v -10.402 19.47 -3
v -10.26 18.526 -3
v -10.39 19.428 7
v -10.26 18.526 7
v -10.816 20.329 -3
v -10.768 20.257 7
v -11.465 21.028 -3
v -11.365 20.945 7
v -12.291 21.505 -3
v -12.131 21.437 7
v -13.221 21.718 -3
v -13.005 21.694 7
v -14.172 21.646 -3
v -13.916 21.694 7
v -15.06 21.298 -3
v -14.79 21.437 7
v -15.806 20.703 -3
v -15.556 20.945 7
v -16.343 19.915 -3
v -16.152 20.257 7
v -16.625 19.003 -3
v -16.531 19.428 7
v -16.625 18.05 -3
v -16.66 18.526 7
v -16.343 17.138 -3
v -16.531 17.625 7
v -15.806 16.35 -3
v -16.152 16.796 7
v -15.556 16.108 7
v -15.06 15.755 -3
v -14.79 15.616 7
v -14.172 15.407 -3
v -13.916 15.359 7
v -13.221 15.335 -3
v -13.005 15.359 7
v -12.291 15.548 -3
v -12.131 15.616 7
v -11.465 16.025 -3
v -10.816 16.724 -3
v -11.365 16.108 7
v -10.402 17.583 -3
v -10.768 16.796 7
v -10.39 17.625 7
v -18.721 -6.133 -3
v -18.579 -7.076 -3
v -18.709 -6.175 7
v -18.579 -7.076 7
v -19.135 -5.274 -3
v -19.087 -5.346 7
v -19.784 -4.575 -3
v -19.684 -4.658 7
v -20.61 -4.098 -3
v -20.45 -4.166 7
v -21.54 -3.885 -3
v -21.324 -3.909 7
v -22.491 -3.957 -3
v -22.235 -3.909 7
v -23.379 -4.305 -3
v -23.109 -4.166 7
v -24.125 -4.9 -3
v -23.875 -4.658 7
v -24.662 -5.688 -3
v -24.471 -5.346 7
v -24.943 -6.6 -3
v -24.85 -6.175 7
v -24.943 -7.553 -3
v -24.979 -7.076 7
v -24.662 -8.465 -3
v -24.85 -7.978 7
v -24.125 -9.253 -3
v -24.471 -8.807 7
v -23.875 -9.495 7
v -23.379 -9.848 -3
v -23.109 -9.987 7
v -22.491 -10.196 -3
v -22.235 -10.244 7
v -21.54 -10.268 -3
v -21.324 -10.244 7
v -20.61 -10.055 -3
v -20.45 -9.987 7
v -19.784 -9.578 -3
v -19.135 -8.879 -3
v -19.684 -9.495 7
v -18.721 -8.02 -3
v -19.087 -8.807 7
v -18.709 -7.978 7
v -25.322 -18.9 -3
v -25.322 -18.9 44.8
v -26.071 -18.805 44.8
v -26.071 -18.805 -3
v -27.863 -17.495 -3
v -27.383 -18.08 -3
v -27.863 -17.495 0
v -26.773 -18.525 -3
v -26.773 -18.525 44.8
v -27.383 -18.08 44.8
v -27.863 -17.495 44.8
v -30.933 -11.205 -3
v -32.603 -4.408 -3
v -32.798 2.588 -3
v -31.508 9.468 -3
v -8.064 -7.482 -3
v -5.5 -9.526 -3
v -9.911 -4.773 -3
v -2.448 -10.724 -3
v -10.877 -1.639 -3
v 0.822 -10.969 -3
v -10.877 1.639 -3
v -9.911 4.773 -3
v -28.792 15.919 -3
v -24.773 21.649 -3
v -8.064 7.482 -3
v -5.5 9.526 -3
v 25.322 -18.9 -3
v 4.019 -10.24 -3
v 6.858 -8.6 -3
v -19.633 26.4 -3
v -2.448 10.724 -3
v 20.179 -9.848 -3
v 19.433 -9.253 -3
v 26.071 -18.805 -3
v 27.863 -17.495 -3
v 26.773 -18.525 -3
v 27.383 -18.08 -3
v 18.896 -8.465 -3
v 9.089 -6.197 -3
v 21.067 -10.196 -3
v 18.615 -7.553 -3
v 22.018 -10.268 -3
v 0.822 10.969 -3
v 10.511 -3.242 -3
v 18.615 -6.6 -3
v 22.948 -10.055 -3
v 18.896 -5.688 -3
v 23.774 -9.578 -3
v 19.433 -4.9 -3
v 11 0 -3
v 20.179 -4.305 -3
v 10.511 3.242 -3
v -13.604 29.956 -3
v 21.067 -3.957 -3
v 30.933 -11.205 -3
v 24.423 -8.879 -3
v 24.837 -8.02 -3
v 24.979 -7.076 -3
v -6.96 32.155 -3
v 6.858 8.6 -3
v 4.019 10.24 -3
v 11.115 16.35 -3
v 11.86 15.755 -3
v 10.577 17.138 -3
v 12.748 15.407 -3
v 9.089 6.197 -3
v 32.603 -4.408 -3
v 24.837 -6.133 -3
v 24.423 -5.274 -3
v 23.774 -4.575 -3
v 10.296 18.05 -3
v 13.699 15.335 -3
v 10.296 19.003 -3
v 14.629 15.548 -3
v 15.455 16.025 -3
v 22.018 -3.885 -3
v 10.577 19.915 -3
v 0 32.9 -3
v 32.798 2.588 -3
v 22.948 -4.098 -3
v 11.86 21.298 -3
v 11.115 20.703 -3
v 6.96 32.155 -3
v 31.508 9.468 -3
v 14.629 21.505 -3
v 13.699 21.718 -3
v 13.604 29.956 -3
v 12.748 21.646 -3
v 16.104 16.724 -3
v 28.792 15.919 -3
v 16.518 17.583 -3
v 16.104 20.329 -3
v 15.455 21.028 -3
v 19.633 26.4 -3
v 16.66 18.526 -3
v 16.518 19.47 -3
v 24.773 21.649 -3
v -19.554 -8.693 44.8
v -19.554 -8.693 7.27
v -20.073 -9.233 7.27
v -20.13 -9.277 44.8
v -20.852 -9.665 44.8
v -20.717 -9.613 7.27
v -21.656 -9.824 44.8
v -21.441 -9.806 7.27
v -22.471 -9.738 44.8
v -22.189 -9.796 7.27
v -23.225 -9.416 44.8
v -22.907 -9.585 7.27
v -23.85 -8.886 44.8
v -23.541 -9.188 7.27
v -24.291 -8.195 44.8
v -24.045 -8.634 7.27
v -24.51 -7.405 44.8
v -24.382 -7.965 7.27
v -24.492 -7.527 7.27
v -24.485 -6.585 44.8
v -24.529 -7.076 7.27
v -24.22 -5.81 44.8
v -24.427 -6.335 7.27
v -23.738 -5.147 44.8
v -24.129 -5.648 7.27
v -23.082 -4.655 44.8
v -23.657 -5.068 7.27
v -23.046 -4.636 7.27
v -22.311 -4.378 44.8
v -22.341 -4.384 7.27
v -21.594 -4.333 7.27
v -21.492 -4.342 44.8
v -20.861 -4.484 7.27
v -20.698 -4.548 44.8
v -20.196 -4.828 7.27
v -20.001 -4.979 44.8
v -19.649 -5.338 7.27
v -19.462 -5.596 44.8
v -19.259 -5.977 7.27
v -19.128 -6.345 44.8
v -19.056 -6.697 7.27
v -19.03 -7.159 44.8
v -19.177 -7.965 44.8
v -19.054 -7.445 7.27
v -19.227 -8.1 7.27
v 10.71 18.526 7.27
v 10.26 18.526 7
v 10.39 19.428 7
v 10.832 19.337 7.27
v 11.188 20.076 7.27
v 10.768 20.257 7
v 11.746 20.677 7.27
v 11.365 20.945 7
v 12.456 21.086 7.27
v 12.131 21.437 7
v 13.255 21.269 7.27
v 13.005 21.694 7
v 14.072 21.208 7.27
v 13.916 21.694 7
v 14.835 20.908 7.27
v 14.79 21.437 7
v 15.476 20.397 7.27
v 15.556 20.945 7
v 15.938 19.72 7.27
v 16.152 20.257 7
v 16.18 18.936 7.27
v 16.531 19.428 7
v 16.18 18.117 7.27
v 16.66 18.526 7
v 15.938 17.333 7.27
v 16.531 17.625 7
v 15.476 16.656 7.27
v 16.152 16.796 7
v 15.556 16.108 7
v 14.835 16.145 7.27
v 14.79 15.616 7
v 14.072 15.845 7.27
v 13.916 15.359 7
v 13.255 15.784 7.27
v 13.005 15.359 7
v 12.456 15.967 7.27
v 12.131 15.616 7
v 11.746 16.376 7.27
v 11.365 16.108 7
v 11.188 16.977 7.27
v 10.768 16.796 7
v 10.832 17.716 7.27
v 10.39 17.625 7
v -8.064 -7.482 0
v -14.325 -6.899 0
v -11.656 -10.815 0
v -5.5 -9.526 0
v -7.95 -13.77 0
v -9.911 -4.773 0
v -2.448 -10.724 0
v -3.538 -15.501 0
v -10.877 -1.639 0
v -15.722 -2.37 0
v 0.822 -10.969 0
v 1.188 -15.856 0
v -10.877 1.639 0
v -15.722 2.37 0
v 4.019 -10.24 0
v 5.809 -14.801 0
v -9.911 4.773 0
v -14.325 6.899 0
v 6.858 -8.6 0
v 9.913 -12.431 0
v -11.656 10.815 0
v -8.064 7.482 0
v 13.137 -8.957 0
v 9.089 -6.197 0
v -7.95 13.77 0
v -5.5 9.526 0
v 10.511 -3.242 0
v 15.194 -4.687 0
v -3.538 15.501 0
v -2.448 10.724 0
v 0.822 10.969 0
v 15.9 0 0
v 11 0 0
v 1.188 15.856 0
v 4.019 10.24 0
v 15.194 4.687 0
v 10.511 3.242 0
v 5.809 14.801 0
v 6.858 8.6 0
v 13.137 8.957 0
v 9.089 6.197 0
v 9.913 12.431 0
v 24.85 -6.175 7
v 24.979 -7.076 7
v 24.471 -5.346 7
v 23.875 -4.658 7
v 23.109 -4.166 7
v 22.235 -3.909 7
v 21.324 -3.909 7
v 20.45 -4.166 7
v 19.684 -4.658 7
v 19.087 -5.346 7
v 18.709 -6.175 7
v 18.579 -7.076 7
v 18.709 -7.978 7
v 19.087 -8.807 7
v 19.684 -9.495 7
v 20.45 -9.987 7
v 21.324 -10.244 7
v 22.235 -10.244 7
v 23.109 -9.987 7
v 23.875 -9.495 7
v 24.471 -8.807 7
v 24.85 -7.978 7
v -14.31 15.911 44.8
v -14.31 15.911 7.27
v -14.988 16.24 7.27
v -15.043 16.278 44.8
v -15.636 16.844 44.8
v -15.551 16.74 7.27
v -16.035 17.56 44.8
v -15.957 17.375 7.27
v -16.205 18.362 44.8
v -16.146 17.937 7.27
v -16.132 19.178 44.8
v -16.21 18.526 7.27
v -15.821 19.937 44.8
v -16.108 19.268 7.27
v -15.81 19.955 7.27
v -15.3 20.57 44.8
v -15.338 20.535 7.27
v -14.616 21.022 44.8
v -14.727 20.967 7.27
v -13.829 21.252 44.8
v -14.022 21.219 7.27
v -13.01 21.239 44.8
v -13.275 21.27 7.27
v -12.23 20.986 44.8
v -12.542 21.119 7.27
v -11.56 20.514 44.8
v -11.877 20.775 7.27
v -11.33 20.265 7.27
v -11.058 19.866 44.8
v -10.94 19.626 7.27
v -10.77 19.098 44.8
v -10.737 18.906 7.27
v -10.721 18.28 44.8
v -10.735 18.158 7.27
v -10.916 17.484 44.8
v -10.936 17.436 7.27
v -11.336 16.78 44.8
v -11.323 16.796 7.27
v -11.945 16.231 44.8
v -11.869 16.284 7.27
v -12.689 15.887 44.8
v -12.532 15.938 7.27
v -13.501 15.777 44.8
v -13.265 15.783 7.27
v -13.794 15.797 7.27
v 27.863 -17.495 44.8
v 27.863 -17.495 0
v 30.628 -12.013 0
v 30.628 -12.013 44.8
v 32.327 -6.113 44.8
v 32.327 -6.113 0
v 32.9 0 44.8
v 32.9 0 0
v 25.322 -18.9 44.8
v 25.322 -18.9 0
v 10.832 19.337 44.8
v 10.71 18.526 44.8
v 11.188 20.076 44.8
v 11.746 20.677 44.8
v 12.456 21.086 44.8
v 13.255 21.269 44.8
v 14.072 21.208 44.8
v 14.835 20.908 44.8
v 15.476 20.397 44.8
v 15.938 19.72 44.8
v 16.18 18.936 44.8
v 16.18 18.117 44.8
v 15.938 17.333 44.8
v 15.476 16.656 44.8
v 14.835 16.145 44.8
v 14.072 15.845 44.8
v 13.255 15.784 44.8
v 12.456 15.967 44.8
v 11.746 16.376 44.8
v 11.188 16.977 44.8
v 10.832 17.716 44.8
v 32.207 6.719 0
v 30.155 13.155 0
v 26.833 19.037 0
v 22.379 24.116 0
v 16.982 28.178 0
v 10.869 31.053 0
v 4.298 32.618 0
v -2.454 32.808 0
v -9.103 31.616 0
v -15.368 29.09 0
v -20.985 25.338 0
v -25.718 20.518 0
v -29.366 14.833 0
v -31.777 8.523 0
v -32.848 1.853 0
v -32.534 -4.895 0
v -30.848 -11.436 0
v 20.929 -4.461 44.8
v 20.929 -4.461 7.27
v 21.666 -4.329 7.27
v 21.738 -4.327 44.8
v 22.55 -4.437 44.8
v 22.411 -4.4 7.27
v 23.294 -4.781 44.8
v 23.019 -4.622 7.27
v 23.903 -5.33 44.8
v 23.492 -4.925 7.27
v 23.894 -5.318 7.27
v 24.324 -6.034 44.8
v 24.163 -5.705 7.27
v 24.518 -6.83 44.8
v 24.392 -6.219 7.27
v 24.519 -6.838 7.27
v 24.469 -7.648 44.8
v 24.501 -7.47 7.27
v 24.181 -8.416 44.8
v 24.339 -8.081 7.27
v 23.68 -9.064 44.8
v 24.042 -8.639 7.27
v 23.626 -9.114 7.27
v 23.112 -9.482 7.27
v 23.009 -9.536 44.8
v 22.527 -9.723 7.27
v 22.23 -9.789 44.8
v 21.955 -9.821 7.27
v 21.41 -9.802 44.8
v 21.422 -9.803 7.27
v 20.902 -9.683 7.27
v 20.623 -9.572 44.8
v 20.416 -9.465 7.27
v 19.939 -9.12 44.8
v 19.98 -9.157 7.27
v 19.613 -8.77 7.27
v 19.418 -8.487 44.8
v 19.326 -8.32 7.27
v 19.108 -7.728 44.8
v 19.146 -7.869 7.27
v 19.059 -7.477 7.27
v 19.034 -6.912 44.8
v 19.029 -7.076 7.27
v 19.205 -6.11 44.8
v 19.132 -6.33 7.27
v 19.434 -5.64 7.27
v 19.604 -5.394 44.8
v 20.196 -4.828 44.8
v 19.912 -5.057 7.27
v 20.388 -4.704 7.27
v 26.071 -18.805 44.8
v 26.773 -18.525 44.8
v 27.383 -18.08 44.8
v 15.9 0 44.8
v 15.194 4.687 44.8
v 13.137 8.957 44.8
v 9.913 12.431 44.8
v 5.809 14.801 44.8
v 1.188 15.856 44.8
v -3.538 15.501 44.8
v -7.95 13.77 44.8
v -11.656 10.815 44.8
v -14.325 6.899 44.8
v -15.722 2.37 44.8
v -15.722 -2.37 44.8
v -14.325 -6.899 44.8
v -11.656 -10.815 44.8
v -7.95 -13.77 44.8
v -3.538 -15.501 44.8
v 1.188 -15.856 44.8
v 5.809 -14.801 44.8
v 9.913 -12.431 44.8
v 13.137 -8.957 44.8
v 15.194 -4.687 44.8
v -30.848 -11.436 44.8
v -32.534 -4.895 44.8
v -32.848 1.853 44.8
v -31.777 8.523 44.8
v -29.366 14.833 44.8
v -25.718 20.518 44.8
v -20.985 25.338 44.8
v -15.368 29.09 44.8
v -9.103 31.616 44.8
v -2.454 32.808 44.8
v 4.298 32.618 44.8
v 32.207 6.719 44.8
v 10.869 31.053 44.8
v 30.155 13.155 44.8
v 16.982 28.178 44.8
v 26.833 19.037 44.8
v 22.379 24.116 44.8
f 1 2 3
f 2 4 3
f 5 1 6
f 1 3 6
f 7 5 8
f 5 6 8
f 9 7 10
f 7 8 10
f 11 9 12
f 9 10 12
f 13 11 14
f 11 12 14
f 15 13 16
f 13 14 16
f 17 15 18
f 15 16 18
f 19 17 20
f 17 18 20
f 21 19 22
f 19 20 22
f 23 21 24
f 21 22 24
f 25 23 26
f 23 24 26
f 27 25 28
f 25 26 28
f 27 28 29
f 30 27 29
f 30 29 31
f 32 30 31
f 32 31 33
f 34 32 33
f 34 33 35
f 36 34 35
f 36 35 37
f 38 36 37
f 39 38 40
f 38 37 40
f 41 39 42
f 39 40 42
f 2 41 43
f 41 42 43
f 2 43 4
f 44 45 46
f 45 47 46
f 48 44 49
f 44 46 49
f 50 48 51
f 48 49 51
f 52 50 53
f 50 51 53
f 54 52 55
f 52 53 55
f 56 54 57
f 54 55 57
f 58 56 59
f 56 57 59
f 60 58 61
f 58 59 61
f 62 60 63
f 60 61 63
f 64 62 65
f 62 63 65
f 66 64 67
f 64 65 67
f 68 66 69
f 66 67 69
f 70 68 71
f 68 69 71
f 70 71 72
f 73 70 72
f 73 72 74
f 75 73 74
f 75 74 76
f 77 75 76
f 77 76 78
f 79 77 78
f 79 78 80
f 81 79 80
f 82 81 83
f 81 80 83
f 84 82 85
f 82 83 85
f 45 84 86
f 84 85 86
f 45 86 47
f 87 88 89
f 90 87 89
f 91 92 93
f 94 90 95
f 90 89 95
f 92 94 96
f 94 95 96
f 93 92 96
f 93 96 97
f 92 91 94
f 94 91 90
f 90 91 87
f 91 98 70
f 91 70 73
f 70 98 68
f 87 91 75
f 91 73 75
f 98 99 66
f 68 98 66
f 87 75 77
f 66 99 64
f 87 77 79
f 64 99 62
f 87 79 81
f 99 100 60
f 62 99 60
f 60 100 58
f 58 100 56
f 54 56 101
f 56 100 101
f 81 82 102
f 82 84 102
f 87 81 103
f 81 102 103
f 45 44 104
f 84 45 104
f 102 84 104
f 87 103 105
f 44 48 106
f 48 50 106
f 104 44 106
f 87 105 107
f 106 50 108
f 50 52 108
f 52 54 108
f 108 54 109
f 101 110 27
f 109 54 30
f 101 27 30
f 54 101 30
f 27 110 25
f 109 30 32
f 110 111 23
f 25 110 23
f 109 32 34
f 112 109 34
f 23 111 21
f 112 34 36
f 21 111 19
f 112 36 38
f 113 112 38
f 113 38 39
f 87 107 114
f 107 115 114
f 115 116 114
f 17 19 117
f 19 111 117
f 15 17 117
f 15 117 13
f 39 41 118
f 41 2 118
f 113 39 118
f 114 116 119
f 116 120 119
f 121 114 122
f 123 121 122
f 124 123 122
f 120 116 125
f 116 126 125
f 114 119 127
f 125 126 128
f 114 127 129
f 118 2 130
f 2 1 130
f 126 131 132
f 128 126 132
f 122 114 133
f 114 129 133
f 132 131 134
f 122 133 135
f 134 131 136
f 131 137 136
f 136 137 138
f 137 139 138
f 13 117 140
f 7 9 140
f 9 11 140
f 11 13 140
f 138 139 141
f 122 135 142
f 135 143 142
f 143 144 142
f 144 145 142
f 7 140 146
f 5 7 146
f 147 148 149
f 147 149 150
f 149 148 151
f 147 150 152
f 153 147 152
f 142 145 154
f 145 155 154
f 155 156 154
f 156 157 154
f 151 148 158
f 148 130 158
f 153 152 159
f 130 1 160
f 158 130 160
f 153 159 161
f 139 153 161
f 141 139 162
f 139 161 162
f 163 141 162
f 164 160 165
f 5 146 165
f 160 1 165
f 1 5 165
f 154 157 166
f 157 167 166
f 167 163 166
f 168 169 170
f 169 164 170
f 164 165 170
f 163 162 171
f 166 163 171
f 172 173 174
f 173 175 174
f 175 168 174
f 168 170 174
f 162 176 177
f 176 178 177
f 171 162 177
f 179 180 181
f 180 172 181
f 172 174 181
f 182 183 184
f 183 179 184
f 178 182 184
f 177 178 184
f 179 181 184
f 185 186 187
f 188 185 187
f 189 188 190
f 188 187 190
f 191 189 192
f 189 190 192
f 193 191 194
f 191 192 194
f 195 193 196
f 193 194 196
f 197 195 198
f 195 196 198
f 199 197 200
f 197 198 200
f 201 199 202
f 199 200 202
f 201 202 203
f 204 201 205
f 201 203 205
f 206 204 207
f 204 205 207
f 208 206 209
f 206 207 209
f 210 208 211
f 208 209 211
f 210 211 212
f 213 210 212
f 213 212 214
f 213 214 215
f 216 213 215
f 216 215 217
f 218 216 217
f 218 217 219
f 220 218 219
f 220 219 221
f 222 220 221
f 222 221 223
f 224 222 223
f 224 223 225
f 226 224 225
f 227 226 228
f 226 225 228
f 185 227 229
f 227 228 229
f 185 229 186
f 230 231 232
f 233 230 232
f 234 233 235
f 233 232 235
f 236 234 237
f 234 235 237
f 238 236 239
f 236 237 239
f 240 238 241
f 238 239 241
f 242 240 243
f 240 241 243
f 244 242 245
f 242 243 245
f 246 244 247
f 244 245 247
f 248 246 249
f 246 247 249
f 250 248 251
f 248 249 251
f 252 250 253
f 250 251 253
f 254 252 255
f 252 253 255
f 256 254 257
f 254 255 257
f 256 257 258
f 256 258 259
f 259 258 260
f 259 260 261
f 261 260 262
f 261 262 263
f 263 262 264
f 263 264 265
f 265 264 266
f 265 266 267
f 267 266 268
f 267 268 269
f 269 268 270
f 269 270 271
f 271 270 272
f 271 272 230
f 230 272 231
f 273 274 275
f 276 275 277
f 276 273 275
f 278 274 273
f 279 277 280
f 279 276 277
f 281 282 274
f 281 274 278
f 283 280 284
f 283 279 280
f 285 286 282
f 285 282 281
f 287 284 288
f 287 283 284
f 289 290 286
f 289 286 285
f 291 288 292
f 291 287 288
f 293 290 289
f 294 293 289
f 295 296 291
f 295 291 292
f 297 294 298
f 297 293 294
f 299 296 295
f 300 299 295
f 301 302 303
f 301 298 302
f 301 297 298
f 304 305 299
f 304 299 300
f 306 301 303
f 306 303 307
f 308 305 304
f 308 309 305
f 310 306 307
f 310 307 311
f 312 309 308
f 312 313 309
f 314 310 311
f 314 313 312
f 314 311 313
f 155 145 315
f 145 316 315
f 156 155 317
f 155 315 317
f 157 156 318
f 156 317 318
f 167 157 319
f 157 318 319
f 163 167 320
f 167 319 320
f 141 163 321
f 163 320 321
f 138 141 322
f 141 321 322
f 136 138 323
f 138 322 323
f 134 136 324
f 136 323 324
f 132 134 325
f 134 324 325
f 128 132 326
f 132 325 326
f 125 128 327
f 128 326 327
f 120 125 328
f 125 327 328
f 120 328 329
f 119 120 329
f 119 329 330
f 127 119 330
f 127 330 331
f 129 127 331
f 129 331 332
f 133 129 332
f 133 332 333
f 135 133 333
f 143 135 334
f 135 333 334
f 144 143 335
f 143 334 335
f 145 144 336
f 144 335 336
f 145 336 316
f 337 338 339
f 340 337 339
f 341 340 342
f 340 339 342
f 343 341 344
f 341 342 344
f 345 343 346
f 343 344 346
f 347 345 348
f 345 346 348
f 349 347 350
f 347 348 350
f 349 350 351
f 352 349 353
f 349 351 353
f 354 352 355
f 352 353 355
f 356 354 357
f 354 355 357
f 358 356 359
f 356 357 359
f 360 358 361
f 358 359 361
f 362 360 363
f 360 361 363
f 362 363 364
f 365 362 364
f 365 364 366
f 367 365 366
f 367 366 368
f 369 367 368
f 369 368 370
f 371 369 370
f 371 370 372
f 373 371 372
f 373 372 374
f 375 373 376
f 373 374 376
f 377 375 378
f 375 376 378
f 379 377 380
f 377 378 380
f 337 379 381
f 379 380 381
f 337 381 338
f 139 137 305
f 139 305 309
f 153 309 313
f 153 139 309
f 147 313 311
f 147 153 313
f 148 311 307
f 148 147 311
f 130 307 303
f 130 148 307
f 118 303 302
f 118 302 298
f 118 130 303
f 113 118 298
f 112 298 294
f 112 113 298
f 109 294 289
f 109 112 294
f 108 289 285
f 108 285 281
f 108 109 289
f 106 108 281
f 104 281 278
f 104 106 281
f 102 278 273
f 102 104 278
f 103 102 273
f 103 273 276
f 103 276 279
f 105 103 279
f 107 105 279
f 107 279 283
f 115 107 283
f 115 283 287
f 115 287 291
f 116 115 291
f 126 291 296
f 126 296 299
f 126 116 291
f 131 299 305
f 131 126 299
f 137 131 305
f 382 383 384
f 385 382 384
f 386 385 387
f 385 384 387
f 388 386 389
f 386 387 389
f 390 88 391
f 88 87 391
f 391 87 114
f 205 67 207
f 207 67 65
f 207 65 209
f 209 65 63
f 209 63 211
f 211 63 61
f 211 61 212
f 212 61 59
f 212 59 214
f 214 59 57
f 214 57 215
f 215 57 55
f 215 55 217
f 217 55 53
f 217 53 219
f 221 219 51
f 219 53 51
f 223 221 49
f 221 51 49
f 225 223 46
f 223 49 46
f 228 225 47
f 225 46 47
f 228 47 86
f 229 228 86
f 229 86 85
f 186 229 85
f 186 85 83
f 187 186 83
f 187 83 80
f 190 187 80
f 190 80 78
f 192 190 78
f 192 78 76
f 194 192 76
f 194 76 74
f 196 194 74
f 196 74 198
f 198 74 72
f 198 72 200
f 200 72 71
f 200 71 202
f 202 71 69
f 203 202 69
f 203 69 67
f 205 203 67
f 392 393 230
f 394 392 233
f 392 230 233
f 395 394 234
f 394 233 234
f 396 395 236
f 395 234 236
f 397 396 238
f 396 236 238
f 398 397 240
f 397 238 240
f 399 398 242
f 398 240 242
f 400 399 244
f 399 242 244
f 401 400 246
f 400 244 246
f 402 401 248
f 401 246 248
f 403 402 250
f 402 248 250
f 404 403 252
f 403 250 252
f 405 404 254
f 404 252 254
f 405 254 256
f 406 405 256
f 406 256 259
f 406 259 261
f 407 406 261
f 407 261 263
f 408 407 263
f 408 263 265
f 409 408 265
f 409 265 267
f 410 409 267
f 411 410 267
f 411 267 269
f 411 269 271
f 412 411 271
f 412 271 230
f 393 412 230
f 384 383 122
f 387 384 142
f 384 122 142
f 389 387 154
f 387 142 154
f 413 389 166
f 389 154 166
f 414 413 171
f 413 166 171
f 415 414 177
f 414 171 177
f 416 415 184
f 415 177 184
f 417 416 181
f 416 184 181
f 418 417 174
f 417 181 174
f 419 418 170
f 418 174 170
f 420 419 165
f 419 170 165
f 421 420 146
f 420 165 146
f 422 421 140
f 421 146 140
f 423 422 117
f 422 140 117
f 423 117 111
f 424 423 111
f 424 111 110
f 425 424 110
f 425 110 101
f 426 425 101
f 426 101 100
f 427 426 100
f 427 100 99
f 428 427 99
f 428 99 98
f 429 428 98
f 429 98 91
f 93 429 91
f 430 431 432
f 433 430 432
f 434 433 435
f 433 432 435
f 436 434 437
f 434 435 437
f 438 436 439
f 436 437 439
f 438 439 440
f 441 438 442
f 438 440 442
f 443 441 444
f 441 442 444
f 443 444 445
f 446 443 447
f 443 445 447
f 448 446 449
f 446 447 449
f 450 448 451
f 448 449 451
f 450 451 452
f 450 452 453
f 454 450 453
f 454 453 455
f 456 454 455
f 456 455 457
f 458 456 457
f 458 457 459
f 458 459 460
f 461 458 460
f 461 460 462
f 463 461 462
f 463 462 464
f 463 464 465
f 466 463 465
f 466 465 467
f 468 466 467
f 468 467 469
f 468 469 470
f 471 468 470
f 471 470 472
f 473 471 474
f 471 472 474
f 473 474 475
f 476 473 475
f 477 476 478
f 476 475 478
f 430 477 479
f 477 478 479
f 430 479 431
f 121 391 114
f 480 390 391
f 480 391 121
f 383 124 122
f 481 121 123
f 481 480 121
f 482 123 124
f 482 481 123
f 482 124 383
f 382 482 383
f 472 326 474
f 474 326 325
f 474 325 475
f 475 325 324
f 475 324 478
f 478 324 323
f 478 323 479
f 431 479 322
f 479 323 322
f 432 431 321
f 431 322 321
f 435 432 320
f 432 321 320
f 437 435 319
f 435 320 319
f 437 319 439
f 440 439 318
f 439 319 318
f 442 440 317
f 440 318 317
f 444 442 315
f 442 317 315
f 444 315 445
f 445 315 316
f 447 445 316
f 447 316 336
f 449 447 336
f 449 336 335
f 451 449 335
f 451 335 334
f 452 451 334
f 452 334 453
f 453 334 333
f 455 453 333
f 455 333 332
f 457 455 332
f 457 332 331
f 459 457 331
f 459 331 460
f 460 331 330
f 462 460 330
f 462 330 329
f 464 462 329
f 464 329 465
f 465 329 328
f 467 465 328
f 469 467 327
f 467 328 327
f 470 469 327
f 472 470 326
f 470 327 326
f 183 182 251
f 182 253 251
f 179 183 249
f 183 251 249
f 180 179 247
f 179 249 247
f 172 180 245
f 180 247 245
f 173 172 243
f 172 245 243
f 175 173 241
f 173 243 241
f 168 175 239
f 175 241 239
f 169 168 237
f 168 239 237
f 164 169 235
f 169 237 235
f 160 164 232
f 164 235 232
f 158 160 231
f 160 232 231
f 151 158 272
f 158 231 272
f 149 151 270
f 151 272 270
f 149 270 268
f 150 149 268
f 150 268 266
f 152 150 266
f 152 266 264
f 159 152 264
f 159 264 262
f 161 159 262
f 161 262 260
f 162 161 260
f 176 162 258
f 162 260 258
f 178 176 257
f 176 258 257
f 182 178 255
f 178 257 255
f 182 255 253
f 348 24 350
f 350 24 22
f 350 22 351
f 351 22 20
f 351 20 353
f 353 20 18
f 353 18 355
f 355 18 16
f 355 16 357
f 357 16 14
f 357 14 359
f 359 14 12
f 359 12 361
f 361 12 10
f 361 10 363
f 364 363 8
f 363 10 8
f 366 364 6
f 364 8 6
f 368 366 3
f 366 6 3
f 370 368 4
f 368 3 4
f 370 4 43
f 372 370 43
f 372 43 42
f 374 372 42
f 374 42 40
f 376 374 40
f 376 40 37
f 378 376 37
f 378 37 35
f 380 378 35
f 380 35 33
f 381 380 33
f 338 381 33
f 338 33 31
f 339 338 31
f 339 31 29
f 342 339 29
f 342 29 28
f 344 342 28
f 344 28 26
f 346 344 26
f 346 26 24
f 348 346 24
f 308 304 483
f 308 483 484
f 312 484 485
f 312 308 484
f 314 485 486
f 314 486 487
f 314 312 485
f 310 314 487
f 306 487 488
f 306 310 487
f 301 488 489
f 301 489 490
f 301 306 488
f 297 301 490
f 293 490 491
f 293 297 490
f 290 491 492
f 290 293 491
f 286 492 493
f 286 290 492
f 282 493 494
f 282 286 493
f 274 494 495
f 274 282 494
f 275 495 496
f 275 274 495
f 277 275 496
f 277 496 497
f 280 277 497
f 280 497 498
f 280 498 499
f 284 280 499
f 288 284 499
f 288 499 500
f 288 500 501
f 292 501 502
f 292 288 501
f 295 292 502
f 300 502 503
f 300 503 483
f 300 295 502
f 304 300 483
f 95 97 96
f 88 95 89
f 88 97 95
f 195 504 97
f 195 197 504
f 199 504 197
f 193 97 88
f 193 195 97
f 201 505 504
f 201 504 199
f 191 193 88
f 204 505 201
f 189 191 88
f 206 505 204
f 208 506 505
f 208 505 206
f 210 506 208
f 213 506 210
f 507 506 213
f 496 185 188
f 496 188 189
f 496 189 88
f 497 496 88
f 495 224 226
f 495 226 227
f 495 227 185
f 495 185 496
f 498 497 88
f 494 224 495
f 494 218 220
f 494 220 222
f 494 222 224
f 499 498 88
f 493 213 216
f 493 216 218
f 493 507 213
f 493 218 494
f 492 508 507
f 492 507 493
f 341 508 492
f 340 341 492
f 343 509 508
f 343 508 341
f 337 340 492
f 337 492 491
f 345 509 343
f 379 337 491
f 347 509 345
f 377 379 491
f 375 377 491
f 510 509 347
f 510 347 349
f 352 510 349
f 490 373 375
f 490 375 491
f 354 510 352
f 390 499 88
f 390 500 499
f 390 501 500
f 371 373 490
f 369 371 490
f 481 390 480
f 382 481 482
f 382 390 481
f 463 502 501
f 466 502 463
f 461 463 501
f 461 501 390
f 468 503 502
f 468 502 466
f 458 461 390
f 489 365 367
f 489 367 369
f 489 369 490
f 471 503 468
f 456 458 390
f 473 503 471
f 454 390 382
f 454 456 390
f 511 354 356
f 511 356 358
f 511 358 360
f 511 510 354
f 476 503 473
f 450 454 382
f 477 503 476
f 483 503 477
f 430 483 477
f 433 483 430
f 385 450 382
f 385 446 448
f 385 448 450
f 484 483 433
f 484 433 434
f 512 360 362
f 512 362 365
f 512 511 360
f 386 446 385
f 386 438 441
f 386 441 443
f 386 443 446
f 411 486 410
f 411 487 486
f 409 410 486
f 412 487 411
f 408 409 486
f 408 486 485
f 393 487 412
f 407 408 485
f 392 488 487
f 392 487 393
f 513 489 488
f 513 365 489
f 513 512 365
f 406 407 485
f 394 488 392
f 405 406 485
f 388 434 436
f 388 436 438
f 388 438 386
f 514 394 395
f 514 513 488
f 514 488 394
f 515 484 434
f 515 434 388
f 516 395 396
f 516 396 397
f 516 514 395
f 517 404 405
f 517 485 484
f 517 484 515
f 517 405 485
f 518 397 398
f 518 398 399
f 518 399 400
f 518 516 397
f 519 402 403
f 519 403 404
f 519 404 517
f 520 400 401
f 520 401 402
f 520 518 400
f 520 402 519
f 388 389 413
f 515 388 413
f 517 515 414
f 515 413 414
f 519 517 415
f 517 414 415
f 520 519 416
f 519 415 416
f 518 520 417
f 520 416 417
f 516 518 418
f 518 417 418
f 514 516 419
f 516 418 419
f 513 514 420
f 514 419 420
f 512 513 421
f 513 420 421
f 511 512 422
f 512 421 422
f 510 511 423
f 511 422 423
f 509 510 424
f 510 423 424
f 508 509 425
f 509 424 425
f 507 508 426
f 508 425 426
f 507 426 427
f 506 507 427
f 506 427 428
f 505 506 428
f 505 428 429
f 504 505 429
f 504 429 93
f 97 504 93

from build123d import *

# Parameters (mm, degrees)
PLAIN_BEARING_RETAINER_SKETCH_R        = 15.9
PLAIN_BEARING_RETAINER_EXTRUSION_DEPTH = 44.8
RETAINER_START                         = -3
RETAINER_WALL_EXTRUDE_OUTLINE_R        = 11
RETAINER_WALL_EXTRUDE_DEPTH            = 3
M5_CLEARANCE_HOLE1_D                   = 5.5
CIRPATTERN1_COUNT                      = 5
FILLET1_R                              = 3
F_6_4MM_M5_INSERT_HOLE_D               = 6.4
F_6_4MM_M5_INSERT_HOLE_DEPTH           = 10
F_6_4MM_M5_INSERT_HOLE_TIP             = 1.922753981


# Read off the part's stored shape, not the designer's step: Retainer Wall Extrude
with BuildPart() as part:
    # Plain Bearing Retainer Sketch → Plain Bearing Retainer Extrusion (new body)
    with BuildSketch(Plane.XY):
        with BuildLine():
            ThreePointArc((32.9, 0), (-9.910302975, 31.371896579), (-26.929537686, -18.9))
            Line((-26.929537686, -18.9), (26.929537686, -18.9))
            ThreePointArc((26.929537686, -18.9), (31.371896579, -9.910302975), (32.9, 0))
        make_face()
        Circle(PLAIN_BEARING_RETAINER_SKETCH_R, mode=Mode.SUBTRACT)
    extrude(amount=PLAIN_BEARING_RETAINER_EXTRUSION_DEPTH)

    # Retainer Wall Extrude outline → Retainer Wall Extrude (add)
    with BuildSketch(Plane.XY.offset(RETAINER_START)):
        with BuildLine():
            Line((-26.929537686, -18.9), (26.929537686, -18.9))
            ThreePointArc((26.929537686, -18.9), (0, 32.9), (-26.929537686, -18.9))
        make_face()
        Circle(RETAINER_WALL_EXTRUDE_OUTLINE_R, mode=Mode.SUBTRACT)
    extrude(amount=RETAINER_WALL_EXTRUDE_DEPTH)

    # M5 Clearance Hole1 (through all)
    with Locations(Plane.XY.offset(44.8)):
        with Locations((13.460282277, 18.526489171)):
            m5_clearance_hole1 = Hole(M5_CLEARANCE_HOLE1_D / 2)

    # CirPattern1: M5 Clearance Hole1 ×5 about axis, 1 skipped
    cirpattern1_axis = Axis((0, 0, 0), (0, 0, -1))
    add([m5_clearance_hole1.rotate(cirpattern1_axis, i * 360 / CIRPATTERN1_COUNT) for i in range(1, CIRPATTERN1_COUNT) if i not in (2,)], mode=Mode.SUBTRACT)

    # Fillet1
    fillet1_edges = [part.edges().sort_by_distance(p)[0] for p in [
        (-26.929537686, -18.9, 22.4),
        (26.929537686, -18.9, 22.4),
    ]]
    fillet(fillet1_edges, radius=FILLET1_R)

    # Ø6.4mm M5 Insert Hole
    with Locations(Plane(origin=(0, 0, -3), x_dir=(-1, 0, 0), z_dir=(0, 0, -1))):
        with Locations((-13.460282277, 18.526489171), (-21.779194223, -7.076489171), (21.779194223, -7.076489171), (13.460282277, 18.526489171)):
            Hole(F_6_4MM_M5_INSERT_HOLE_D / 2, depth=F_6_4MM_M5_INSERT_HOLE_DEPTH)
            with Locations((0, 0, -(F_6_4MM_M5_INSERT_HOLE_DEPTH + F_6_4MM_M5_INSERT_HOLE_TIP / 2))):  # 118° drill point
                Cone(0, F_6_4MM_M5_INSERT_HOLE_D / 2, F_6_4MM_M5_INSERT_HOLE_TIP, mode=Mode.SUBTRACT)


solid = part.part
